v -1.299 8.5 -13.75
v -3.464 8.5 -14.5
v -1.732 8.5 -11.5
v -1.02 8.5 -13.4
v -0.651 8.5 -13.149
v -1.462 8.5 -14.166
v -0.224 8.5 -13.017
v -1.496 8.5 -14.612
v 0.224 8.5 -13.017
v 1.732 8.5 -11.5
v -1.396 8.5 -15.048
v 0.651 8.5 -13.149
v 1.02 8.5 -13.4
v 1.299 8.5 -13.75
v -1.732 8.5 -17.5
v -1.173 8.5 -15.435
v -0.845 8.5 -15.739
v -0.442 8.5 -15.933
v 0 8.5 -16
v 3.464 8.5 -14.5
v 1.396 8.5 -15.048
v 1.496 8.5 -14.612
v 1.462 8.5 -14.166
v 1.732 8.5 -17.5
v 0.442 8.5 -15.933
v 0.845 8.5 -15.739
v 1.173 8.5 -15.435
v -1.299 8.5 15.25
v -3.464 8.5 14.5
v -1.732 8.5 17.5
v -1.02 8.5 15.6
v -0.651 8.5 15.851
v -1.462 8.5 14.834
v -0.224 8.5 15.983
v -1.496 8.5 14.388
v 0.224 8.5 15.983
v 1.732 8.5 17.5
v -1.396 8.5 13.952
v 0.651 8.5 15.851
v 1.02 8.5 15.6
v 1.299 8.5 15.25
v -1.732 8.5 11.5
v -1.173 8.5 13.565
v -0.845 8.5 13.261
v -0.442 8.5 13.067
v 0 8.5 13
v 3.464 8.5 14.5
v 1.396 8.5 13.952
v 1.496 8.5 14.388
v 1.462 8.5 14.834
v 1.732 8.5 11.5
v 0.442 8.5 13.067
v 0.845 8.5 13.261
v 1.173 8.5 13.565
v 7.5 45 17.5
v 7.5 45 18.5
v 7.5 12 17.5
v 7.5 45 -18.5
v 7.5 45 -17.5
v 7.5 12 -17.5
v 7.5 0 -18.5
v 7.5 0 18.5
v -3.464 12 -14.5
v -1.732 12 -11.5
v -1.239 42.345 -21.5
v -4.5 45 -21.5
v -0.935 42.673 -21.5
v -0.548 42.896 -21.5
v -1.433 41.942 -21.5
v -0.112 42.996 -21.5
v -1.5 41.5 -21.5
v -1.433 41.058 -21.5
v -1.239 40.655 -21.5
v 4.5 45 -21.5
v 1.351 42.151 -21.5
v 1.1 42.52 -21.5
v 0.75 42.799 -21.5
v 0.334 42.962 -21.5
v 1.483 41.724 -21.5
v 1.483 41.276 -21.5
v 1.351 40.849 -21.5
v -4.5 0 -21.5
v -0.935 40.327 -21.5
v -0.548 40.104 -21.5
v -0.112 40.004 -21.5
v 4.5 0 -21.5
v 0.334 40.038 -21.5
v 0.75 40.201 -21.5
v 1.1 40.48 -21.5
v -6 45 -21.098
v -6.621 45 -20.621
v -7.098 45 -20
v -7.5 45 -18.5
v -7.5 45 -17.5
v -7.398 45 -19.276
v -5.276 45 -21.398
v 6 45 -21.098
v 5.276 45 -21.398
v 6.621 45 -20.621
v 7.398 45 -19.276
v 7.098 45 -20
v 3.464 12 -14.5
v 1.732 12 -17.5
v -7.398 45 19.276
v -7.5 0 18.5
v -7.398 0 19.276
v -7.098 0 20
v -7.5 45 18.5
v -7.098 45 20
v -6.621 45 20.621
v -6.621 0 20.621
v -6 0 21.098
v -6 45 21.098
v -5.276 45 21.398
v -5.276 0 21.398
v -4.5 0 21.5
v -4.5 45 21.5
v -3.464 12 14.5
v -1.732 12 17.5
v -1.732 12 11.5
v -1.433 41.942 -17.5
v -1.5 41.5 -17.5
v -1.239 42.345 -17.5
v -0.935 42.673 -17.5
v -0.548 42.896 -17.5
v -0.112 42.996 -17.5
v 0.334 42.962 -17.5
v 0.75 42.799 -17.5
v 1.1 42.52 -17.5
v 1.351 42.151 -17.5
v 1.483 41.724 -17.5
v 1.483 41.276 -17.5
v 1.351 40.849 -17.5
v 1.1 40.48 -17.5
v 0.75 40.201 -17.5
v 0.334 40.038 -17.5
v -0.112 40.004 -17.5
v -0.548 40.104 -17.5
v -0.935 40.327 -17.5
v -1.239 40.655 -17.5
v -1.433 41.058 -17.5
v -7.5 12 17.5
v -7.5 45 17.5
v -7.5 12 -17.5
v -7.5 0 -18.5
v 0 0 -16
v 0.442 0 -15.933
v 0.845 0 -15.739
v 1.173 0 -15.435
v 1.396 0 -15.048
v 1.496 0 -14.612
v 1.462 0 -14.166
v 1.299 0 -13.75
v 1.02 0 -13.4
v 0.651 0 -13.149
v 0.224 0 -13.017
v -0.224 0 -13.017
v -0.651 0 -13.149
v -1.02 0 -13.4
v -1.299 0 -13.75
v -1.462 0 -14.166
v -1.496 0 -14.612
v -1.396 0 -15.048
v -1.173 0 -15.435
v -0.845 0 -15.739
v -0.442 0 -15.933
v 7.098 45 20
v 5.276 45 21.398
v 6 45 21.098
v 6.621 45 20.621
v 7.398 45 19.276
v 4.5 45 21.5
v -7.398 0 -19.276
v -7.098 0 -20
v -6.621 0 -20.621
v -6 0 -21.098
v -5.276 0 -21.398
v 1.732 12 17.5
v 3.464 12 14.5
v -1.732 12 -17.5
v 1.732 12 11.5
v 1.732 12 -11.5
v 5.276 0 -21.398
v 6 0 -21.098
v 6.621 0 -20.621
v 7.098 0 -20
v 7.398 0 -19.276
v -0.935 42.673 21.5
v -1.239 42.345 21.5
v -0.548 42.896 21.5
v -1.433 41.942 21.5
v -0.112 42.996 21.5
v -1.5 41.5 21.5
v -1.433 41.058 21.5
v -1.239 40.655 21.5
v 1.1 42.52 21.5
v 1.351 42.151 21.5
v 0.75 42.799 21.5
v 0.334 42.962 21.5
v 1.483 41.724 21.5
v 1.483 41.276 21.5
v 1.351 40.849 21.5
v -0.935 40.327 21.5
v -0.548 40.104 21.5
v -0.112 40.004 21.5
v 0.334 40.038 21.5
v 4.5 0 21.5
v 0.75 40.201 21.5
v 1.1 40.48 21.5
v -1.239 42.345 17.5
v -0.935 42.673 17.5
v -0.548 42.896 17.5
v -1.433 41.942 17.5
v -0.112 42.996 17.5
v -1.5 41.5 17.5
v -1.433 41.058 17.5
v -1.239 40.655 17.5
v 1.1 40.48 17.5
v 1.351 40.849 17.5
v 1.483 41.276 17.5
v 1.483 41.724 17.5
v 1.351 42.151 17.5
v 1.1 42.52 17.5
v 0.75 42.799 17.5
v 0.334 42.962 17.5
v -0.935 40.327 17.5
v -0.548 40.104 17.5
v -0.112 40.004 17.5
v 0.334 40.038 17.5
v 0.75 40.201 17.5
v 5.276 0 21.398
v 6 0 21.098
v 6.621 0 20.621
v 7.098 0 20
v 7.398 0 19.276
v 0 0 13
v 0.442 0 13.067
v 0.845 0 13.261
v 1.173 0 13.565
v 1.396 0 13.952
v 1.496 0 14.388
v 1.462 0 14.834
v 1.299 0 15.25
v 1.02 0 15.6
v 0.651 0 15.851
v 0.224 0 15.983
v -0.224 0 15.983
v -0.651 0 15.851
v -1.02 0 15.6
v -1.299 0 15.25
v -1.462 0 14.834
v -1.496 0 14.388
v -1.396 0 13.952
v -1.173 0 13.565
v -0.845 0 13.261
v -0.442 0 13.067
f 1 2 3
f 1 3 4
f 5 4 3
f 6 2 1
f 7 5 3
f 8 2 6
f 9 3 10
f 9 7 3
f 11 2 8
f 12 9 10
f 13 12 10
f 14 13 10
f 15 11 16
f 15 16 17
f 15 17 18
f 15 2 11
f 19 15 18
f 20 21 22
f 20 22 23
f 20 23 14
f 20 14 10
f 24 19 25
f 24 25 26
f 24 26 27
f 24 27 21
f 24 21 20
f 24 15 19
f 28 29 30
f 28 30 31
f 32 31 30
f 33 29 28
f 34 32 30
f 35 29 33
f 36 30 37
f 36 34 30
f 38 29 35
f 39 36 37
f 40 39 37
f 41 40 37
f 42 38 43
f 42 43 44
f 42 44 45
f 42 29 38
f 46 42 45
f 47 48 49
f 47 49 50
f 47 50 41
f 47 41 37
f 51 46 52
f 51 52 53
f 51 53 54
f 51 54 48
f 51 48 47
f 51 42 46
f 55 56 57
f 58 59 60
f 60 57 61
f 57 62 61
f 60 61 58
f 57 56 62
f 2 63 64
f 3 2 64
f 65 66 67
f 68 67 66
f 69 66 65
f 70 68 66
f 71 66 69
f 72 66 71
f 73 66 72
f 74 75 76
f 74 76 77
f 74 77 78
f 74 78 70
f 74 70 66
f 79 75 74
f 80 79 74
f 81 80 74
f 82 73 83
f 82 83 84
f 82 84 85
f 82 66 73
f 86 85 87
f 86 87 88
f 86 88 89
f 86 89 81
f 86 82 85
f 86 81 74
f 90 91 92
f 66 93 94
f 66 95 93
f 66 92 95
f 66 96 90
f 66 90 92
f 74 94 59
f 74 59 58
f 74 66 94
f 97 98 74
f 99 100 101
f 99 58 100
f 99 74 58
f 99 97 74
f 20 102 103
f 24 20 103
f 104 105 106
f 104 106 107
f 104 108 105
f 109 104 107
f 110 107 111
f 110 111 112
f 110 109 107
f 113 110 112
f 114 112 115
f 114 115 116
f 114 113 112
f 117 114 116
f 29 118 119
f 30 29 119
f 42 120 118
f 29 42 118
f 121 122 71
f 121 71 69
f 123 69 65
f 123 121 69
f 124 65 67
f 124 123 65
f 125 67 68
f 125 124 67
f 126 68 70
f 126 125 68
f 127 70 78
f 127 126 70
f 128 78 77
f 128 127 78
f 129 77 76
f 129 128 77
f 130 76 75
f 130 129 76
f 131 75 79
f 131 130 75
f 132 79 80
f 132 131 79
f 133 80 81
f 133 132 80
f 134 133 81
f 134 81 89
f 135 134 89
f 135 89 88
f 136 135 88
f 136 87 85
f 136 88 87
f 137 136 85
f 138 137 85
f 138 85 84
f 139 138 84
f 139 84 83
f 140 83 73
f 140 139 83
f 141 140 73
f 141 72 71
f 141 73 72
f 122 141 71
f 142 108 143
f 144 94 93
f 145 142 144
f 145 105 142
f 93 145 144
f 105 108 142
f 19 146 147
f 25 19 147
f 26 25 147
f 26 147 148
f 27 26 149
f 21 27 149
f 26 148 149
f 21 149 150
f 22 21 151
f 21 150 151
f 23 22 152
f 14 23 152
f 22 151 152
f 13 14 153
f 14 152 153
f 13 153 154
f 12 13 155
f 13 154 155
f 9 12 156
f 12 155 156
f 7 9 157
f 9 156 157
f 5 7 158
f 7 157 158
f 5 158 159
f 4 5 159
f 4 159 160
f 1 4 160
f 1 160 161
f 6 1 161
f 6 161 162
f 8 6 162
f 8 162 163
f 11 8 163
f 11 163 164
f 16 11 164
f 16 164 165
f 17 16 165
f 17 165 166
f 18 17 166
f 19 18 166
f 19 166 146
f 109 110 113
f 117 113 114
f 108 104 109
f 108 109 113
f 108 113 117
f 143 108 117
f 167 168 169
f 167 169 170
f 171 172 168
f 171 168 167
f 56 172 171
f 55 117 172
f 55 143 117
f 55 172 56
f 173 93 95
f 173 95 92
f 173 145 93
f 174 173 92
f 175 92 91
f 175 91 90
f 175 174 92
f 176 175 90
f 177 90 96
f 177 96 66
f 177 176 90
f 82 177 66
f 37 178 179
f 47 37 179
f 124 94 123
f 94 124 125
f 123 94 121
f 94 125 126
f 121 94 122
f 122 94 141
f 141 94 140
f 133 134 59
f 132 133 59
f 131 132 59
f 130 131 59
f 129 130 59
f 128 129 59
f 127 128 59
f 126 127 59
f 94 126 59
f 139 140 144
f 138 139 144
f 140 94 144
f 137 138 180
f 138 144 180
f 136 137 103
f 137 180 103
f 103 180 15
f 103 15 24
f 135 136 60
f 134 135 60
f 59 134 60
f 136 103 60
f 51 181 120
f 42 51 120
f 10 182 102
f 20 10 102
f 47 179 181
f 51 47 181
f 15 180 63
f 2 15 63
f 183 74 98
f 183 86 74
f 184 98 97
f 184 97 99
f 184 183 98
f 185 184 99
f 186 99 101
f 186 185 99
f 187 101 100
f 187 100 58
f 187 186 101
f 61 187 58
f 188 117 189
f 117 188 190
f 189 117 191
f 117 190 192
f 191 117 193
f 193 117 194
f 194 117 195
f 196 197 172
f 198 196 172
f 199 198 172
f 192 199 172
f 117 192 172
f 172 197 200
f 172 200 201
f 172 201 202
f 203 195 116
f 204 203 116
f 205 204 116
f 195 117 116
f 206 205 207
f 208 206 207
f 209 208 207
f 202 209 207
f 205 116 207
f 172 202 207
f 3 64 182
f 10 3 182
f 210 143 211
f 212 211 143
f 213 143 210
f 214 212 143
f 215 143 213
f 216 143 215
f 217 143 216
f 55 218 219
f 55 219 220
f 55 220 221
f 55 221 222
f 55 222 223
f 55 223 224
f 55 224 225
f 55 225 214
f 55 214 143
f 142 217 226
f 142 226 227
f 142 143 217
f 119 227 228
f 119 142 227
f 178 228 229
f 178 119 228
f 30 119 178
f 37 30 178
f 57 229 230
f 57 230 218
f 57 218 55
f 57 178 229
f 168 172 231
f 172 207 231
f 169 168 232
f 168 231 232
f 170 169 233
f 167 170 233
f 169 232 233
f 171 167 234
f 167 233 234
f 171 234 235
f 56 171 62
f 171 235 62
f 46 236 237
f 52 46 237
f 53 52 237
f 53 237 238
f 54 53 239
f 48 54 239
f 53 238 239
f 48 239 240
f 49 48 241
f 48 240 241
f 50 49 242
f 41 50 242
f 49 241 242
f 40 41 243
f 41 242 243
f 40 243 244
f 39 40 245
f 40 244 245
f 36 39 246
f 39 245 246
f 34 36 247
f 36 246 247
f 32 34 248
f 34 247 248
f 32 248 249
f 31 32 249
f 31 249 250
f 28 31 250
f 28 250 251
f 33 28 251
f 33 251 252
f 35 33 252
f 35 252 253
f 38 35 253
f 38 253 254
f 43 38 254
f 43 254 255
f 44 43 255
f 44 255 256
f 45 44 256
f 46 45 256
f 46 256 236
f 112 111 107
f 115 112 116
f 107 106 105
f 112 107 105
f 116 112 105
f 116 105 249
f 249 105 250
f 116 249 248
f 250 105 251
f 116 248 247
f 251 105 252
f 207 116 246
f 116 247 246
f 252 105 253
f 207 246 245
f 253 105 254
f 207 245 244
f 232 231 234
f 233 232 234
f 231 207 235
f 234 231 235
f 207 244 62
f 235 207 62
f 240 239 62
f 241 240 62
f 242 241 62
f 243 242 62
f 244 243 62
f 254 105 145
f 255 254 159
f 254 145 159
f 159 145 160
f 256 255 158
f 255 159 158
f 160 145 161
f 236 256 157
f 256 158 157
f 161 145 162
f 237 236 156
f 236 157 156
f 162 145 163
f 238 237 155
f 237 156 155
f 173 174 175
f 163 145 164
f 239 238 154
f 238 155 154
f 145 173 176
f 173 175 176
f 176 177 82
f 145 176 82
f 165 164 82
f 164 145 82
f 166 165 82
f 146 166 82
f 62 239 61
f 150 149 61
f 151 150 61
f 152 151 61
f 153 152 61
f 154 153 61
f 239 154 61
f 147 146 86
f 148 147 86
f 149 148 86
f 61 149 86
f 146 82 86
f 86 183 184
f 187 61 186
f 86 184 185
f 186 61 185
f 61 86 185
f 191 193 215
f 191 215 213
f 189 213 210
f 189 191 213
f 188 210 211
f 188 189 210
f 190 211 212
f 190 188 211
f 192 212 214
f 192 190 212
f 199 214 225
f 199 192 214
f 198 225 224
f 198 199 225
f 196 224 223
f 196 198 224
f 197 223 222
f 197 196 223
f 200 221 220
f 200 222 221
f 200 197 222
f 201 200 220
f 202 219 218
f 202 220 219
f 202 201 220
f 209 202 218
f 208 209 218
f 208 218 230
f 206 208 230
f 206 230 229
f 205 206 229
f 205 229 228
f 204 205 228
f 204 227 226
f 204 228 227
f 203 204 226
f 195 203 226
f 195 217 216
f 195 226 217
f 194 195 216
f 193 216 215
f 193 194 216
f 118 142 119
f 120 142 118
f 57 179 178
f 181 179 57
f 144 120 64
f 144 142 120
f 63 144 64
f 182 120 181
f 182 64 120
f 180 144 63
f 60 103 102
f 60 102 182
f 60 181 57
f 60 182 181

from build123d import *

# Parameters (mm, degrees)
CROQUIS1_W                 = 15
CROQUIS1_H                 = 43
SALIENTE_EXTRUIR1_DEPTH    = 12
CROQUIS2_W                 = 15
CROQUIS2_H                 = 4
SALIENTE_EXTRUIR2_DEPTH    = 33
CROQUIS3_R                 = 1.5
CORTAR_EXTRUIR1_DEPTH      = 13
CORTAR_EXTRUIR2_DEPTH      = 3.5
REDONDEO1_R                = 3
CORTAR_EXTRUIR3_DEPTH      = 63.691705991
CORTAR_EXTRUIR3_DEPTH_BACK = 63.691705991
CROQUIS5_R                 = 1.5


with BuildPart() as part:
    # Croquis1 → Saliente-Extruir1 (new body)
    with BuildSketch(Plane(origin=(0, 0, 0), x_dir=(1, 0, 0), z_dir=(0, 1, 0))):
        Rectangle(CROQUIS1_W, CROQUIS1_H)
    extrude(amount=SALIENTE_EXTRUIR1_DEPTH)

    # Croquis2 → Saliente-Extruir2 (add)
    with BuildSketch(Plane(origin=(0, 12, 0), x_dir=(1, 0, 0), z_dir=(0, 1, 0))):
        with Locations((0, 19.5)):
            Rectangle(CROQUIS2_W, CROQUIS2_H)
        with Locations((0, -19.5)):
            Rectangle(CROQUIS2_W, CROQUIS2_H)
    extrude(amount=SALIENTE_EXTRUIR2_DEPTH)

    # Croquis3 → Cortar-Extruir1 (cut)
    with BuildSketch(Plane.XZ):
        with Locations(Location((0, 14.5, 0), (0, 0, 270))):
            Circle(CROQUIS3_R)
        with Locations(Location((0, -14.5, 0), (0, 0, 270))):
            Circle(CROQUIS3_R)
    extrude(amount=-CORTAR_EXTRUIR1_DEPTH, mode=Mode.SUBTRACT)

    # Croquis4 → Cortar-Extruir2 (cut)
    with BuildSketch(Plane(origin=(0, 12, 0), x_dir=(1, 0, 0), z_dir=(0, 1, 0))):
        Polygon((3.464101615, 14.5), (1.732050808, 17.5), (-1.732050808, 17.5), (-3.464101615, 14.5), (-1.732050808, 11.5), (1.732050808, 11.5), align=None)
        Polygon((3.464101615, -14.5), (1.732050808, -11.5), (-1.732050808, -11.5), (-3.464101615, -14.5), (-1.732050808, -17.5), (1.732050808, -17.5), align=None)
    extrude(amount=-CORTAR_EXTRUIR2_DEPTH, mode=Mode.SUBTRACT)

    # Redondeo1
    redondeo1_edges = [part.edges().sort_by_distance(p)[0] for p in [
        (-7.5, 22.5, -21.5),
        (7.5, 22.5, -21.5),
        (7.5, 22.5, 21.5),
        (-7.5, 22.5, 21.5),
    ]]
    fillet(redondeo1_edges, radius=REDONDEO1_R)

    # Croquis5 → Cortar-Extruir3 (cut, two sides: drawn at the far end of the back side and taken through both)
    with BuildSketch(Plane(origin=(0, 0, -21.5), x_dir=(-1, 0, 0), z_dir=(0, 0, -1)).offset(-CORTAR_EXTRUIR3_DEPTH_BACK)):
        with Locations((0, 41.5)):
            Circle(CROQUIS5_R)
    extrude(amount=CORTAR_EXTRUIR3_DEPTH + CORTAR_EXTRUIR3_DEPTH_BACK, mode=Mode.SUBTRACT)


solid = part.part
